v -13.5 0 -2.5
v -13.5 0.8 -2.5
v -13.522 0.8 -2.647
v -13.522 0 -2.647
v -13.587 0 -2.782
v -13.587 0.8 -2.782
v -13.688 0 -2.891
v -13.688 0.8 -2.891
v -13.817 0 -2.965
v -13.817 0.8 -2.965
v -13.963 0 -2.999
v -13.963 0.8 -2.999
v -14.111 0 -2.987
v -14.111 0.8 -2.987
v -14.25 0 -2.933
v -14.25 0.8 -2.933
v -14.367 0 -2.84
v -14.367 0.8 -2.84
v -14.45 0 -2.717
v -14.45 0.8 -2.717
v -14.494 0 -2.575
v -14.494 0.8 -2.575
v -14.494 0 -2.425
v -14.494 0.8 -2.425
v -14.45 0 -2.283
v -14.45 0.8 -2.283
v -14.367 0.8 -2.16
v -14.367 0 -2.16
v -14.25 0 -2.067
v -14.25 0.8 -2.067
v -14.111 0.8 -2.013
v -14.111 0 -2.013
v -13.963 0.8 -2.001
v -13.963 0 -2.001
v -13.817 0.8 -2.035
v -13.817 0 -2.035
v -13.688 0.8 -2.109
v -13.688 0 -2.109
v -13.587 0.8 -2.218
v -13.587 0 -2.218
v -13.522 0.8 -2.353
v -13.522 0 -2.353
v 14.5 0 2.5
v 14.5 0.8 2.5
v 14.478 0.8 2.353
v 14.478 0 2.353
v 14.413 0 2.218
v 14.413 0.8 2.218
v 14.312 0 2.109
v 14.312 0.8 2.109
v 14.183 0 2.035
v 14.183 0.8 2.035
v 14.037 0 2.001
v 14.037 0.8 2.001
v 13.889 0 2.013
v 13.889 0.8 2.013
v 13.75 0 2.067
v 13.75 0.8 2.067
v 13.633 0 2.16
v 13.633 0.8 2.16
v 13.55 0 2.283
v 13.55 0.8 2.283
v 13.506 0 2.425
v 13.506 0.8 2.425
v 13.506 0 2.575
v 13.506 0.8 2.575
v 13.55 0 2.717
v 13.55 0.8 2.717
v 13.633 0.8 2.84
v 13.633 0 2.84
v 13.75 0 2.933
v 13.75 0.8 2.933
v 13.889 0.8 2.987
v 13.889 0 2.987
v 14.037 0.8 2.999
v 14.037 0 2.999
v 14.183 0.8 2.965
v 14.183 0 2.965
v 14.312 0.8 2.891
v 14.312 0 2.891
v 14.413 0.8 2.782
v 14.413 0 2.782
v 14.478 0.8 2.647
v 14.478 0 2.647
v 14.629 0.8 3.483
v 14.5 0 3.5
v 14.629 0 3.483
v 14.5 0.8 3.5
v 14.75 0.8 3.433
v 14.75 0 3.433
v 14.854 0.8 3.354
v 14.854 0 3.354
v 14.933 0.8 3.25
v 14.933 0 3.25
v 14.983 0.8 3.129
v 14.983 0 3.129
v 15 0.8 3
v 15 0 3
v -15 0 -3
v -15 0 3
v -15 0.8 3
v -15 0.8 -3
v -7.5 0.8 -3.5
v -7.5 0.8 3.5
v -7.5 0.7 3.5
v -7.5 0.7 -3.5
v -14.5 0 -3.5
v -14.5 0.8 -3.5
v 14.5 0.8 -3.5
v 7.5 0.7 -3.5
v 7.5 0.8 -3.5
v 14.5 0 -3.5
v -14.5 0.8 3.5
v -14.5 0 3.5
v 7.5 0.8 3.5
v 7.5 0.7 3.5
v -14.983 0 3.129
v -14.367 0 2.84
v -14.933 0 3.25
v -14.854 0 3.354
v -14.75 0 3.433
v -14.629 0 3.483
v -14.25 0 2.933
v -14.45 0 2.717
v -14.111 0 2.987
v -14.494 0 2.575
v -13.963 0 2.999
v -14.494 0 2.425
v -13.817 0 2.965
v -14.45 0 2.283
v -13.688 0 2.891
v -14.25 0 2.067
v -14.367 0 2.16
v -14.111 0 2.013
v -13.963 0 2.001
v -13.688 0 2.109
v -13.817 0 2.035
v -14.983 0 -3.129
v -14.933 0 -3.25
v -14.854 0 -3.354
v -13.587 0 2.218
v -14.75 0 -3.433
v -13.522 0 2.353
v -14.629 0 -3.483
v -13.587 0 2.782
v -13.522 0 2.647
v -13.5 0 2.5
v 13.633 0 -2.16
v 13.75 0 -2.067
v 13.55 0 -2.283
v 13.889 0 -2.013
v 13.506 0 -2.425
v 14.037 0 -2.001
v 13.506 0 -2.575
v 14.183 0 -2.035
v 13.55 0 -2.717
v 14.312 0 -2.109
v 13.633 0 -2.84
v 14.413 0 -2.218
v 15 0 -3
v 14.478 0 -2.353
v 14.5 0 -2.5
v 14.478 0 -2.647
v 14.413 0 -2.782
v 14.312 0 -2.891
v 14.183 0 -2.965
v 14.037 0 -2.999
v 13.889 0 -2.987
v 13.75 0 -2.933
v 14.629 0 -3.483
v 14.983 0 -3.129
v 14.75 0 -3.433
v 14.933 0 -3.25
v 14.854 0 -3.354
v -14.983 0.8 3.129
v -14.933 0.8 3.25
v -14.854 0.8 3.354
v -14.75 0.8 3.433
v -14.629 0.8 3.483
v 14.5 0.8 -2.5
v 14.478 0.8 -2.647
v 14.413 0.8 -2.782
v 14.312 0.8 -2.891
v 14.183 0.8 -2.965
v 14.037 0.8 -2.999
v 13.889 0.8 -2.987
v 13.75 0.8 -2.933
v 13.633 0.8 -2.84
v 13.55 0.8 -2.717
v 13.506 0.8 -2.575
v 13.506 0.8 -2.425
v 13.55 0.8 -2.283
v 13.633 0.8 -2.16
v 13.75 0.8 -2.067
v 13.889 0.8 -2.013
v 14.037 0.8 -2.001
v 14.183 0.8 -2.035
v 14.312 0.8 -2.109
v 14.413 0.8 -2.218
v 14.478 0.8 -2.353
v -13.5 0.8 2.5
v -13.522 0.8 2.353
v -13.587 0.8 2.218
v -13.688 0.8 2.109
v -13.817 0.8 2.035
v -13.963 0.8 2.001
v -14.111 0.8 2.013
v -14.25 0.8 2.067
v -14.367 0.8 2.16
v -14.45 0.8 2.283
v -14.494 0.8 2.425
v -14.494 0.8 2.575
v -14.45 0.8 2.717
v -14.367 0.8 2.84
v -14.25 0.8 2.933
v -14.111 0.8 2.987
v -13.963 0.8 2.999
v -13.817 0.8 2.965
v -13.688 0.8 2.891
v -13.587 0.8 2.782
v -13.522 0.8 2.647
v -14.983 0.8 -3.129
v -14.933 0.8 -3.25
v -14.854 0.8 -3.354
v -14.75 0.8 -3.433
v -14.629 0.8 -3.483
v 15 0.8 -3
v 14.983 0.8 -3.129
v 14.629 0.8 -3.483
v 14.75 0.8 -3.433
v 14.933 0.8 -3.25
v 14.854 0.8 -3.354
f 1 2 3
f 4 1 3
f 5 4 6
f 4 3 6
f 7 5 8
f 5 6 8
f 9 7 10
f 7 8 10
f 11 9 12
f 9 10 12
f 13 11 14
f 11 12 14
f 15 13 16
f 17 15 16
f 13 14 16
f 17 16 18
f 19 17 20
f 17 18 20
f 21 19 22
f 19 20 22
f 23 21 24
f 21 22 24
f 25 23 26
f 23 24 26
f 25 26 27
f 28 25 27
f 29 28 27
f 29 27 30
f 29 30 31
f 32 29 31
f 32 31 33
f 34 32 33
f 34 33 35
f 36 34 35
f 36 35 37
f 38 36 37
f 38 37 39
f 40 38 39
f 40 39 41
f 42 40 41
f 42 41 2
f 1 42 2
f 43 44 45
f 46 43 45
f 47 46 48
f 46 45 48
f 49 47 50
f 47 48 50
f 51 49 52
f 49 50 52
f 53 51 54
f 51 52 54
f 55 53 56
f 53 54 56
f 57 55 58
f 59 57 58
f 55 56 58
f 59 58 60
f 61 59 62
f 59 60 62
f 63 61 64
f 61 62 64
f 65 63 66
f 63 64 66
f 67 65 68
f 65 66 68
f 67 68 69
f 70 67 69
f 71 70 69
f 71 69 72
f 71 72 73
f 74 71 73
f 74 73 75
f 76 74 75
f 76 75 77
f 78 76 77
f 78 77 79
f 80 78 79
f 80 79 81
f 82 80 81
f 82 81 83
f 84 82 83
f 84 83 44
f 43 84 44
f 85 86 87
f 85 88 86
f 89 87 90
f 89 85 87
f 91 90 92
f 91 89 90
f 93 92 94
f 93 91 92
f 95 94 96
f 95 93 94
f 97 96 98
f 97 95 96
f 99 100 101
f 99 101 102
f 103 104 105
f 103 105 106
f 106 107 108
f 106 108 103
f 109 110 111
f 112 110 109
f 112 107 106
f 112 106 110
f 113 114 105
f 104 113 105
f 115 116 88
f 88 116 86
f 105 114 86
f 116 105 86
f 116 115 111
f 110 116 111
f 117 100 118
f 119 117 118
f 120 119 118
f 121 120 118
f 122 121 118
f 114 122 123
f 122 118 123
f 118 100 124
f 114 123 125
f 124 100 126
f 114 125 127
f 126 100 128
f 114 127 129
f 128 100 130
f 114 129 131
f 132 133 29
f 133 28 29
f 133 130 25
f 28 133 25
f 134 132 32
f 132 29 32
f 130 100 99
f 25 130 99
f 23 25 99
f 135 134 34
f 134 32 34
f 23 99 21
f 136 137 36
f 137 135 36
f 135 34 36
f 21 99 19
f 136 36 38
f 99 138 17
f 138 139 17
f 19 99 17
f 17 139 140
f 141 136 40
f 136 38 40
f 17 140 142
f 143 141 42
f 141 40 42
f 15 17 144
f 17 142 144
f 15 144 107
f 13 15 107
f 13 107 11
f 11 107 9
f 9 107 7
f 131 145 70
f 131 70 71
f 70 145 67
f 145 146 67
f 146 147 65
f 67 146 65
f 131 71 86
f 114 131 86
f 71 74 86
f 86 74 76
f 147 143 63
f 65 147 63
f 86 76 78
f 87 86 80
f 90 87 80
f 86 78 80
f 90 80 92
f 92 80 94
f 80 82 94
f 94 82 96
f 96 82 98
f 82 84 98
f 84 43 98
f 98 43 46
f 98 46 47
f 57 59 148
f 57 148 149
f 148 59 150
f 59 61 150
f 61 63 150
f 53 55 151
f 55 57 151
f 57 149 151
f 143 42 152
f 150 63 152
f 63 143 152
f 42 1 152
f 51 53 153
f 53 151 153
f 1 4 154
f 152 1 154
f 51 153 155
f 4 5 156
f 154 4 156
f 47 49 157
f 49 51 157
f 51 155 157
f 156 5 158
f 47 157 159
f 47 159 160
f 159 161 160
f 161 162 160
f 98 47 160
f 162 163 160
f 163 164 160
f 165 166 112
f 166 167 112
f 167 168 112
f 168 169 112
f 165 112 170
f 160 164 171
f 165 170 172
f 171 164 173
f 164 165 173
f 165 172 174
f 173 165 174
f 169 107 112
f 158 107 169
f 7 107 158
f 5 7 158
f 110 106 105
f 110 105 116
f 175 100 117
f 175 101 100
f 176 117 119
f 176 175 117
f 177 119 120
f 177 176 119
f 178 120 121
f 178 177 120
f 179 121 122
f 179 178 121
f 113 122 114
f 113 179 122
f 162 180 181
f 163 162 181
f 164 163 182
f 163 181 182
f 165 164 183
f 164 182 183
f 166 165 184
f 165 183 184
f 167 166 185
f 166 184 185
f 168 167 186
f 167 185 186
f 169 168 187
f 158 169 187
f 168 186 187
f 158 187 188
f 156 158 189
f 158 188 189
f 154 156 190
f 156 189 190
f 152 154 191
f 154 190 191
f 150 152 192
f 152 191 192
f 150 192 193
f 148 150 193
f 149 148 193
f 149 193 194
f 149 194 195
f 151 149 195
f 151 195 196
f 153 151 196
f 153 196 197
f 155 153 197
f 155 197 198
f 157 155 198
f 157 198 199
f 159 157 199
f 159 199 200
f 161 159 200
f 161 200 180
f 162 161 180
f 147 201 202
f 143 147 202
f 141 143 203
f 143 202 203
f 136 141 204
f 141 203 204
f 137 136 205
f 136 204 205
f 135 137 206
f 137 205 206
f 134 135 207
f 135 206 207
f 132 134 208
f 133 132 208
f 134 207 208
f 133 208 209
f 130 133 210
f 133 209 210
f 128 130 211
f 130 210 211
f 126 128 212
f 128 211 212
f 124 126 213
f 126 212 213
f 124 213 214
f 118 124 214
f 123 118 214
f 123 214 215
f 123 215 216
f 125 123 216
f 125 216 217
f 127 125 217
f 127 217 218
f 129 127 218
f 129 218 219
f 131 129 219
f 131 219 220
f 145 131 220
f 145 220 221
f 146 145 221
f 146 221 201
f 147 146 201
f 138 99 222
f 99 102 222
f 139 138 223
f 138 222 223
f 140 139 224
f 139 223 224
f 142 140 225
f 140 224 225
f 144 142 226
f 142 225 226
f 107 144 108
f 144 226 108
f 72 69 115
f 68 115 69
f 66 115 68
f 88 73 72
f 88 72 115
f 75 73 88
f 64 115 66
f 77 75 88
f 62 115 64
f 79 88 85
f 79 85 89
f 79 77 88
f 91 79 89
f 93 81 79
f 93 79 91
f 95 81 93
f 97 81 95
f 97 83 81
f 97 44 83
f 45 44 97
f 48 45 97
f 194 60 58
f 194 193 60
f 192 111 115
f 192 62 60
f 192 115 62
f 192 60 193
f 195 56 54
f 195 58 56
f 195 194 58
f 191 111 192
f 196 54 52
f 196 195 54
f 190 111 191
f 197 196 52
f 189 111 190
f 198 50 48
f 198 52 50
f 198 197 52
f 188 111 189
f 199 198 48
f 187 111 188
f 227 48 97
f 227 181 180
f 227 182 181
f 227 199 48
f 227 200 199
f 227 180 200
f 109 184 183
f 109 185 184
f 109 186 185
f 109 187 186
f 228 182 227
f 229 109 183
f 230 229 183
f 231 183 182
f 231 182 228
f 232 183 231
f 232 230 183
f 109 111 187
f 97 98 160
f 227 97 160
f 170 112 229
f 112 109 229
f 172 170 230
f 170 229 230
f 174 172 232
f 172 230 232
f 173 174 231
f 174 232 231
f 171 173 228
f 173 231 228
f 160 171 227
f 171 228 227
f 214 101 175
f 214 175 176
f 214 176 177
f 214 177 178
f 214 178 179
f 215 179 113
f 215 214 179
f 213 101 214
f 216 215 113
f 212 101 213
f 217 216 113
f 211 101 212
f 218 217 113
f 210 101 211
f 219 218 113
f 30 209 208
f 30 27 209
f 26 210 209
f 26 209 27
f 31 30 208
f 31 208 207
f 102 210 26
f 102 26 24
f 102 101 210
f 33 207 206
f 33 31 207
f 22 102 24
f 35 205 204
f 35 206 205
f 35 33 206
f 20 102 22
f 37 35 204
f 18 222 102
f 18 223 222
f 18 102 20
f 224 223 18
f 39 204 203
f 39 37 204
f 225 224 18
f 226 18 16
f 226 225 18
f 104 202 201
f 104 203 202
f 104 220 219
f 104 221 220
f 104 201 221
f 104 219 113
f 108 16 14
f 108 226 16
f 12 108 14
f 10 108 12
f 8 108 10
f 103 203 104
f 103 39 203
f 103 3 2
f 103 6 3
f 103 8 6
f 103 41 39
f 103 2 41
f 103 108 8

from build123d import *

# Parameters (mm, degrees)
SKETCH_1_W          = 30
SKETCH_1_H          = 7
EXTRUDE_1_DEPTH     = 0.8
SKETCH_2_R          = 0.5
CUT_EXTRUDE_1_DEPTH = 1.8
FILLET_1_R          = 0.5
SKETCH_3_W          = 15
SKETCH_3_H          = 7
CUT_EXTRUDE_2_DEPTH = 0.1


with BuildPart() as part:
    # 草图1 → 凸台-拉伸1 (new body)
    with BuildSketch(Plane(origin=(0, 0, 0), x_dir=(1, 0, 0), z_dir=(0, 1, 0))):
        Rectangle(SKETCH_1_W, SKETCH_1_H)
    extrude(amount=EXTRUDE_1_DEPTH)

    # 草图2 → 切除-拉伸1 (cut, through all)
    with BuildSketch(Plane(origin=(0, 0.8, 0), x_dir=(1, 0, 0), z_dir=(0, 1, 0))):
        with Locations((-14, 2.5)):
            Circle(SKETCH_2_R)
        with Locations((14, 2.5)):
            Circle(SKETCH_2_R)
        with Locations((14, -2.5)):
            Circle(SKETCH_2_R)
        with Locations((-14, -2.5)):
            Circle(SKETCH_2_R)
    extrude(amount=-CUT_EXTRUDE_1_DEPTH, mode=Mode.SUBTRACT)

    # 圆角1
    fillet_1_edges = [part.edges().sort_by_distance(p)[0] for p in [
        (-15, 0.4, -3.5),
        (15, 0.4, -3.5),
        (15, 0.4, 3.5),
        (-15, 0.4, 3.5),
    ]]
    fillet(fillet_1_edges, radius=FILLET_1_R)

    # 草图3 → 切除-拉伸2 (cut)
    with BuildSketch(Plane(origin=(0, 0.8, 0), x_dir=(1, 0, 0), z_dir=(0, 1, 0))):
        Rectangle(SKETCH_3_W, SKETCH_3_H)
    extrude(amount=-CUT_EXTRUDE_2_DEPTH, mode=Mode.SUBTRACT)


solid = part.part
